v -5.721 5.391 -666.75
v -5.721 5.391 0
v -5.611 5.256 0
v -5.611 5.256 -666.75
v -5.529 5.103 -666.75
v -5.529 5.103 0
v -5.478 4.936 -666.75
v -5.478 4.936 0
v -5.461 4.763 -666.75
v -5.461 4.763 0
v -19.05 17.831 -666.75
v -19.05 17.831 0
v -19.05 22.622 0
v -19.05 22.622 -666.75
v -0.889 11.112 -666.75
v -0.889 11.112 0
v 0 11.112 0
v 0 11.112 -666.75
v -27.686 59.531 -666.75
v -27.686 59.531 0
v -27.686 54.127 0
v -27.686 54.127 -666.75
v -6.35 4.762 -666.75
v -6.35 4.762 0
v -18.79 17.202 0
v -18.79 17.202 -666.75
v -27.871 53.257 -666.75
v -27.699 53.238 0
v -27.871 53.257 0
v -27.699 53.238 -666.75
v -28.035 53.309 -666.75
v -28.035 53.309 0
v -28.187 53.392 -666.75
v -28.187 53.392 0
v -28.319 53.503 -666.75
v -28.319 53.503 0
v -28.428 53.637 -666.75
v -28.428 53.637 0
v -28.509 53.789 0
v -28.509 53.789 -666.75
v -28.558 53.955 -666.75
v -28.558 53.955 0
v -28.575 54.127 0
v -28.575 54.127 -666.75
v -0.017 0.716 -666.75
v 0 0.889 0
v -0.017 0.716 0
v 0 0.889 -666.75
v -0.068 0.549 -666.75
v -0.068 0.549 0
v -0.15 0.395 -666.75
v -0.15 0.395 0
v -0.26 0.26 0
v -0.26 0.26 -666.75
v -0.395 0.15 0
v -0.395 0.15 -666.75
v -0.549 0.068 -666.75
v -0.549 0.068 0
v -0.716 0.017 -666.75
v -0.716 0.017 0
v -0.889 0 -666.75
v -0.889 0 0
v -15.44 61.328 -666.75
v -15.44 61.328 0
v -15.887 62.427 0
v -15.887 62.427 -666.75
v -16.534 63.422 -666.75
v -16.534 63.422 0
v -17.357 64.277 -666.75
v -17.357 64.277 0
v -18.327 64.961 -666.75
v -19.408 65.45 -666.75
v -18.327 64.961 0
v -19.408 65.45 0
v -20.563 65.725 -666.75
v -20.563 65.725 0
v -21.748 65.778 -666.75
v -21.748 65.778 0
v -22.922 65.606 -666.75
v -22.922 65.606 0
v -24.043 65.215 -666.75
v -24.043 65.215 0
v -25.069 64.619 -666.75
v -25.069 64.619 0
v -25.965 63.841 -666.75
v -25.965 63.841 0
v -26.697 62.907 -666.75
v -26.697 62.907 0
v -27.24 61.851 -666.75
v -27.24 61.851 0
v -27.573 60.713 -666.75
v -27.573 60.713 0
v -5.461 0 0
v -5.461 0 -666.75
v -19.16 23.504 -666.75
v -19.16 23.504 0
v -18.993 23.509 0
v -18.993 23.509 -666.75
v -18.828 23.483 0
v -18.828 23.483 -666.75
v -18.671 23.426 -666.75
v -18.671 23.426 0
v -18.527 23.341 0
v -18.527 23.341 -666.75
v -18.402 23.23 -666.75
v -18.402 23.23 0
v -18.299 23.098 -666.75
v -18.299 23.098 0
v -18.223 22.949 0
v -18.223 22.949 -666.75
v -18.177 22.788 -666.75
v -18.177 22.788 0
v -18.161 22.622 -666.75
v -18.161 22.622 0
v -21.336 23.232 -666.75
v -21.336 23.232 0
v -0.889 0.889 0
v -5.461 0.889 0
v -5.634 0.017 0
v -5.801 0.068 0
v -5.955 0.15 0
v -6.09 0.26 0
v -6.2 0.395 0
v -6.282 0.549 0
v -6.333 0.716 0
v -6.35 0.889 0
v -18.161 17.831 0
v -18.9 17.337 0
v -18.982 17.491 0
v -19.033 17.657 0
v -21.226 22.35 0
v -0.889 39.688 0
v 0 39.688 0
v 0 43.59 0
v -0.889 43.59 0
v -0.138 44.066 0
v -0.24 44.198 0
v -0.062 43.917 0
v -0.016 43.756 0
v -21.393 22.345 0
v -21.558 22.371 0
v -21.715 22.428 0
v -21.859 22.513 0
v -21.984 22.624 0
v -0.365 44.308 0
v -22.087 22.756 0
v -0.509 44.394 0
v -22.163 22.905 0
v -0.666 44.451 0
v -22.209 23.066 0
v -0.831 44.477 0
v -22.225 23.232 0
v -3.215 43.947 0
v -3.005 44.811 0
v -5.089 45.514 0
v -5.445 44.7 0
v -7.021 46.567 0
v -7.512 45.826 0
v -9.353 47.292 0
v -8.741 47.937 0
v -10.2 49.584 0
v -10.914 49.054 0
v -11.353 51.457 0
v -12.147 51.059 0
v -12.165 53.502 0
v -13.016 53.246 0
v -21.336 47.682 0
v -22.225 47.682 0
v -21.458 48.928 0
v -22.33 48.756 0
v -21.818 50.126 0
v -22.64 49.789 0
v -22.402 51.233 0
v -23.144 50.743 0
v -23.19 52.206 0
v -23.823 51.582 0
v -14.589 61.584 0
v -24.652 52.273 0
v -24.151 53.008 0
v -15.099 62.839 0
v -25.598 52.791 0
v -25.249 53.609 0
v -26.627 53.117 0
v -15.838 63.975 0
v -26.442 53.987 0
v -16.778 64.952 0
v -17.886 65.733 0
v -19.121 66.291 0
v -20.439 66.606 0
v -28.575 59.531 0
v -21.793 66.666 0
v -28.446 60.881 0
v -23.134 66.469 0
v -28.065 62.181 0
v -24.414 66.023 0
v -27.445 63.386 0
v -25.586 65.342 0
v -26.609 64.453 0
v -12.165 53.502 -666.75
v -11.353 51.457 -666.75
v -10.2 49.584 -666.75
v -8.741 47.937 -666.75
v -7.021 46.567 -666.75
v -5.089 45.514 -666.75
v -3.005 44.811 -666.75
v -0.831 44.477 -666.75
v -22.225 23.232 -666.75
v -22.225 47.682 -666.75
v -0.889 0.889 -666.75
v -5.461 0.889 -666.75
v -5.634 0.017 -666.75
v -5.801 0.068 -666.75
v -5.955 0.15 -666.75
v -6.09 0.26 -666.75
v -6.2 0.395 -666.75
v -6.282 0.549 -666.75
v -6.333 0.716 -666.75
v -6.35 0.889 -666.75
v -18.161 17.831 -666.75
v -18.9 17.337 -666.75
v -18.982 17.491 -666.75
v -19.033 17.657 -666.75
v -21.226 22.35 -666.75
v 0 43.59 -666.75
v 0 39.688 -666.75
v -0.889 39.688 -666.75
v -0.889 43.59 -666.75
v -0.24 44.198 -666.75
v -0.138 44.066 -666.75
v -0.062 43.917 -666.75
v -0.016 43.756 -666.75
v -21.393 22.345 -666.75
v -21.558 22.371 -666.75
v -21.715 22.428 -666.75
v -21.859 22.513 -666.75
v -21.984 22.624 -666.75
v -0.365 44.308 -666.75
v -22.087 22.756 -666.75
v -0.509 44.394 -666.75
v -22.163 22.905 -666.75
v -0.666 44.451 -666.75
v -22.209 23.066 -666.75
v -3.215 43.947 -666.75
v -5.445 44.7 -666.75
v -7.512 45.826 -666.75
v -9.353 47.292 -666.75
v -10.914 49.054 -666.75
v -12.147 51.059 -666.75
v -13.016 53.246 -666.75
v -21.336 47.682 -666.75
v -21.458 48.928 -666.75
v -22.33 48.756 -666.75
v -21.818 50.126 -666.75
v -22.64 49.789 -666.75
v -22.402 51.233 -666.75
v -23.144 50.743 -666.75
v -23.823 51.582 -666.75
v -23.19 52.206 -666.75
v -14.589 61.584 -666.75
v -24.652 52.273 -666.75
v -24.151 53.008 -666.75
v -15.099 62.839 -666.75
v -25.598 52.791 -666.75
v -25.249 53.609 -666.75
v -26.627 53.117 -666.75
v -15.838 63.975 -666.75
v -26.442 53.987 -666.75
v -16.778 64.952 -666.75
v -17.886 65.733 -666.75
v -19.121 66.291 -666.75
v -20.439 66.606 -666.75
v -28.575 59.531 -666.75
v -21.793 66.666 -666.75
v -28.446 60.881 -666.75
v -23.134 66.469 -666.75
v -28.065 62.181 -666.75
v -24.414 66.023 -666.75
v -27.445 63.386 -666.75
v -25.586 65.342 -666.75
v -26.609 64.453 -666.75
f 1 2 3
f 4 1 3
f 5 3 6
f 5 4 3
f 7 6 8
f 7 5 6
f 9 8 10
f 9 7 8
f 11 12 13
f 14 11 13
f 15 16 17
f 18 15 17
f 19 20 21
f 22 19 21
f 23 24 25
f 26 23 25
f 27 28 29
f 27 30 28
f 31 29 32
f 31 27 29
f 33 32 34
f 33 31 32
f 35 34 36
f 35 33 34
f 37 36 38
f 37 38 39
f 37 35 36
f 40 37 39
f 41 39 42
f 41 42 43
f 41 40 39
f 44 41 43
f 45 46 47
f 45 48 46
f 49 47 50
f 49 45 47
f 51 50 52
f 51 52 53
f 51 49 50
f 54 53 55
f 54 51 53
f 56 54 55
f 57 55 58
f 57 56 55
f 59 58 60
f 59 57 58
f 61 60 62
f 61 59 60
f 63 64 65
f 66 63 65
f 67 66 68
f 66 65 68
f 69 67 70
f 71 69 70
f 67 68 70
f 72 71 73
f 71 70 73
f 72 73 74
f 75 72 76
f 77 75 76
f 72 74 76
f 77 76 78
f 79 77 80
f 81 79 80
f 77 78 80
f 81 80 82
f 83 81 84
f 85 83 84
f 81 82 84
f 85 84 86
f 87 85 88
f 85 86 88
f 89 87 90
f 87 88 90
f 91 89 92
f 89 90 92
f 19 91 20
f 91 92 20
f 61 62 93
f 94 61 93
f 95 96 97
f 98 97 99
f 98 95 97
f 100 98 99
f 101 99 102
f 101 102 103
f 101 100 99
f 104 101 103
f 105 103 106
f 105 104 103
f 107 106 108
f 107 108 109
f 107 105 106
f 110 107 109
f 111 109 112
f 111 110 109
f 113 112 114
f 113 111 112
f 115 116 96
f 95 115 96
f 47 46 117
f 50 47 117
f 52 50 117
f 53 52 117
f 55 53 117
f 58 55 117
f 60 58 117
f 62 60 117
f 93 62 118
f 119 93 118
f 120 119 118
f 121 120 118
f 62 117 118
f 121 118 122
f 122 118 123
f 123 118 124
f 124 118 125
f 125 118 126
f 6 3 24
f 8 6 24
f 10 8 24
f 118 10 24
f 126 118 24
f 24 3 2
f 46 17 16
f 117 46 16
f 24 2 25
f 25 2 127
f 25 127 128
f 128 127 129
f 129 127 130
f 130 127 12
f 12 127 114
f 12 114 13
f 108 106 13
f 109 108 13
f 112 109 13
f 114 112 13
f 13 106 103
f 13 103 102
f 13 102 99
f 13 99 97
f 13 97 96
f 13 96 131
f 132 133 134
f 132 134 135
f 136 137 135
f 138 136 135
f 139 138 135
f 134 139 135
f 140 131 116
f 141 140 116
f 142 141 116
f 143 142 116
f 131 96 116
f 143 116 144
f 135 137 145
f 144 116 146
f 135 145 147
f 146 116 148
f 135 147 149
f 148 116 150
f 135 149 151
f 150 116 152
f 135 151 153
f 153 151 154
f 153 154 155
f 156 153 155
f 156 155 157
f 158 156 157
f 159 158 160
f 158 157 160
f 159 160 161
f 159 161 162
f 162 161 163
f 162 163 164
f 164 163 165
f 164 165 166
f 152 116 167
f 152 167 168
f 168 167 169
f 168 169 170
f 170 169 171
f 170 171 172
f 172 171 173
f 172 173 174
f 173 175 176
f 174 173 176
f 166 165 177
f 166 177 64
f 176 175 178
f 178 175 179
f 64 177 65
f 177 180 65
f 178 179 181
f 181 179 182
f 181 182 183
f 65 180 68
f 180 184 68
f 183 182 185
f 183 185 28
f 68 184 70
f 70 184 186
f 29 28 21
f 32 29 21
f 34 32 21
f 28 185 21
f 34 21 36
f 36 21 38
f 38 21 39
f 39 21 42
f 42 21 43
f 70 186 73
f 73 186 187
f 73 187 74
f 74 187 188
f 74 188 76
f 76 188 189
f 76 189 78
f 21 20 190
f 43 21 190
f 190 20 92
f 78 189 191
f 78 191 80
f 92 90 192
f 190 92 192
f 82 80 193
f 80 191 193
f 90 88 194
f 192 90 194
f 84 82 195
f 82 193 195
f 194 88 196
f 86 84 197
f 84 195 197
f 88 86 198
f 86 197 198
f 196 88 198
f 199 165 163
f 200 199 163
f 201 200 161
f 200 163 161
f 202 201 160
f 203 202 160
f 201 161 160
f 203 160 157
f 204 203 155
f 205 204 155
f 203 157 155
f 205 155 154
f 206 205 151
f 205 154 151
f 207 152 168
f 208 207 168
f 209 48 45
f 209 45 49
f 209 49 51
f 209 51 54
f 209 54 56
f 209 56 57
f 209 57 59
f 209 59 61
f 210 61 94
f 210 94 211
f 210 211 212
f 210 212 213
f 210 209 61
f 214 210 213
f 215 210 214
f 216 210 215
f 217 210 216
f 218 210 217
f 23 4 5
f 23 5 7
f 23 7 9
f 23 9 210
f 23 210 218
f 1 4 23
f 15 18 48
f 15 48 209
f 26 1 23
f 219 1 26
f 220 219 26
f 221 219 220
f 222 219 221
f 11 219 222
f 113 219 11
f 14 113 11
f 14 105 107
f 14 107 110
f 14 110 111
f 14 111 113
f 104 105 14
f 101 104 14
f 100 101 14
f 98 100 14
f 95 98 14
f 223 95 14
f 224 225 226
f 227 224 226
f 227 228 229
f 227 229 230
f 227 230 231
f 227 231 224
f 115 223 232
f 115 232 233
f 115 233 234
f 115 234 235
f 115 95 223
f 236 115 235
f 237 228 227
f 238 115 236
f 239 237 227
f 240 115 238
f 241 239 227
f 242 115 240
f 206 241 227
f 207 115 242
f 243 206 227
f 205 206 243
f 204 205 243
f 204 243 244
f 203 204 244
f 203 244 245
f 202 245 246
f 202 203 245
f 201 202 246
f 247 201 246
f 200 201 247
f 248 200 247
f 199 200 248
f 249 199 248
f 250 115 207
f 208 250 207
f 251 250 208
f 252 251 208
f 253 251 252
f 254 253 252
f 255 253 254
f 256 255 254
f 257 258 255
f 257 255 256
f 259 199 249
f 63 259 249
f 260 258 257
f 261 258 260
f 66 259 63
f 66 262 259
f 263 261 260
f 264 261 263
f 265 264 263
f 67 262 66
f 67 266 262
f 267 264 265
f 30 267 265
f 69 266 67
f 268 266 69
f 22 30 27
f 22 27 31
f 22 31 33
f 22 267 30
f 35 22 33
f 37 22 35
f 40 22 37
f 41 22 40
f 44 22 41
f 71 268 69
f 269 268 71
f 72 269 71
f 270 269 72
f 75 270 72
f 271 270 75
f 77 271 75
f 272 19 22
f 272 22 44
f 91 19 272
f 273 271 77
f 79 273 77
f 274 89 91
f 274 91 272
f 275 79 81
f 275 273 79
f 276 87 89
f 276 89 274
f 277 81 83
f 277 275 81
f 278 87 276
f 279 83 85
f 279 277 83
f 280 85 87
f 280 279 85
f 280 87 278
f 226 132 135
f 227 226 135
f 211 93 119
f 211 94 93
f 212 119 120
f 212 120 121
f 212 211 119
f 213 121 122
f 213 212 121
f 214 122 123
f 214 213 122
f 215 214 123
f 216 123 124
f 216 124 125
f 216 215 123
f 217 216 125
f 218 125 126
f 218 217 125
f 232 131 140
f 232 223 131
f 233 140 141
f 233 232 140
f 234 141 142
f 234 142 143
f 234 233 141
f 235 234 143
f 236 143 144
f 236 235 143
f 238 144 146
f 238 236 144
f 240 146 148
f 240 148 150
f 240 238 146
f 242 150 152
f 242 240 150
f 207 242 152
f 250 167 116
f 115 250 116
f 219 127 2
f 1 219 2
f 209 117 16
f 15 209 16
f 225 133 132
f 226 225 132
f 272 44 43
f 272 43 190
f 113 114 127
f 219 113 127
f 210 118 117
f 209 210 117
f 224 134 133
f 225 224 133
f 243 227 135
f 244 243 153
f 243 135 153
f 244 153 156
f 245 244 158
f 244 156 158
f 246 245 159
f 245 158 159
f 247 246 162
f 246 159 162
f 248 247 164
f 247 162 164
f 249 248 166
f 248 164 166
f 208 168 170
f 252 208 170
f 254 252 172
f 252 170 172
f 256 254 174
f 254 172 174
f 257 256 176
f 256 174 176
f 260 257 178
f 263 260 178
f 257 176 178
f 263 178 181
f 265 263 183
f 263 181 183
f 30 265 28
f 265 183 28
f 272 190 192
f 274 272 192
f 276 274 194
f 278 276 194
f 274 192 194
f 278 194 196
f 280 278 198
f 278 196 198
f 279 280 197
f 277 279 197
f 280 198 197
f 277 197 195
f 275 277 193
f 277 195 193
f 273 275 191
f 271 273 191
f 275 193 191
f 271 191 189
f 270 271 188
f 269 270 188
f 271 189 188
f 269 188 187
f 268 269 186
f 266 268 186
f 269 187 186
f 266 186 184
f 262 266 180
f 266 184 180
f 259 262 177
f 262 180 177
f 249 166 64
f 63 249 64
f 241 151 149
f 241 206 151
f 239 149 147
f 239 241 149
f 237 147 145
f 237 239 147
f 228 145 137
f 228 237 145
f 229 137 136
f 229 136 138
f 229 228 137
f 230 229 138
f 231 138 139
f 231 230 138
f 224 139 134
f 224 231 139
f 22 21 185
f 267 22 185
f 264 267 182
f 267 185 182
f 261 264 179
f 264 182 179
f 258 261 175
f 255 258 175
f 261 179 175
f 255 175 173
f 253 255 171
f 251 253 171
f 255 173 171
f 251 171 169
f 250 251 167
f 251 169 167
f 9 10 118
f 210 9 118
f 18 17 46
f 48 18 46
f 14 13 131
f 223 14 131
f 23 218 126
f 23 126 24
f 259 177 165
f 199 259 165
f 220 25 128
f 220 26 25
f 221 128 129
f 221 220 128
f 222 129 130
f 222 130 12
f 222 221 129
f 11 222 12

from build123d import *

# Parameters (mm, degrees)
EXTRUDE_THIN1_DEPTH = 666.75
FILLET1_R           = 0.889


with BuildPart() as part:
    # Sketch1 → Extrude-Thin1 (new body)
    with BuildSketch(Plane.XY):
        with BuildLine():
            Line((0, 11.1125), (0, 0))
            Line((0, 0), (-6.35, 0))
            Line((-6.35, 0), (-6.35, 4.7625))
            Line((-6.35, 4.7625), (-19.05, 17.4625))
            Line((-19.05, 17.4625), (-19.05, 22.621875))
            Line((-19.05, 22.621875), (-22.225, 22.225))
            Line((-22.225, 22.225), (-22.225, 47.681988686))
            ThreePointArc((-22.225, 47.681988686), (-24.143830542, 51.882118892), (-28.575, 53.18125))
            Line((-28.575, 53.18125), (-28.575, 59.53125))
            ThreePointArc((-28.575, 59.53125), (-22.468372416, 66.599314881), (-14.588636772, 61.583519054))
            Line((-14.588636772, 61.583519054), (-12.164645739, 53.501521681))
            ThreePointArc((-12.164645739, 53.501521681), (-7.581369446, 46.96114151), (0, 44.45))
            Line((0, 44.45), (0, 39.6875))
            Line((0, 39.6875), (-0.889, 39.6875))
            Line((-0.889, 39.6875), (-0.889, 43.59011062))
            ThreePointArc((-0.889, 43.59011062), (-8.464520872, 46.519251795), (-13.016170941, 53.246128199))
            Line((-13.016170941, 53.246128199), (-15.440161973, 61.328125572))
            ThreePointArc((-15.440161973, 61.328125572), (-22.339308293, 65.719733473), (-27.686, 59.53125))
            Line((-27.686, 59.53125), (-27.686, 54.12653483))
            ThreePointArc((-27.686, 54.12653483), (-23.190217566, 52.20566736), (-21.336, 47.681988686))
            Line((-21.336, 47.681988686), (-21.336, 23.232043392))
            Line((-21.336, 23.232043392), (-18.161, 23.628918392))
            Line((-18.161, 23.628918392), (-18.161, 17.830735857))
            Line((-18.161, 17.830735857), (-5.461, 5.130735857))
            Line((-5.461, 5.130735857), (-5.461, 0.889))
            Line((-5.461, 0.889), (-0.889, 0.889))
            Line((-0.889, 0.889), (-0.889, 11.1125))
            Line((-0.889, 11.1125), (0, 11.1125))
        make_face()
    extrude(amount=-EXTRUDE_THIN1_DEPTH)

    # Fillet1
    fillet1_edges = [part.edges().sort_by_distance(p)[0] for p in [
        (-18.161, 23.628918392, -333.375),
        (-5.461, 5.130735857, -333.375),
        (0, 0, -333.375),
        (-6.35, 0, -333.375),
        (-19.05, 17.4625, -333.375),
        (-22.225, 22.225, -333.375),
        (-28.575, 53.18125, -333.375),
        (0, 44.45, -333.375),
    ]]
    fillet(fillet1_edges, radius=FILLET1_R)


solid = part.part
